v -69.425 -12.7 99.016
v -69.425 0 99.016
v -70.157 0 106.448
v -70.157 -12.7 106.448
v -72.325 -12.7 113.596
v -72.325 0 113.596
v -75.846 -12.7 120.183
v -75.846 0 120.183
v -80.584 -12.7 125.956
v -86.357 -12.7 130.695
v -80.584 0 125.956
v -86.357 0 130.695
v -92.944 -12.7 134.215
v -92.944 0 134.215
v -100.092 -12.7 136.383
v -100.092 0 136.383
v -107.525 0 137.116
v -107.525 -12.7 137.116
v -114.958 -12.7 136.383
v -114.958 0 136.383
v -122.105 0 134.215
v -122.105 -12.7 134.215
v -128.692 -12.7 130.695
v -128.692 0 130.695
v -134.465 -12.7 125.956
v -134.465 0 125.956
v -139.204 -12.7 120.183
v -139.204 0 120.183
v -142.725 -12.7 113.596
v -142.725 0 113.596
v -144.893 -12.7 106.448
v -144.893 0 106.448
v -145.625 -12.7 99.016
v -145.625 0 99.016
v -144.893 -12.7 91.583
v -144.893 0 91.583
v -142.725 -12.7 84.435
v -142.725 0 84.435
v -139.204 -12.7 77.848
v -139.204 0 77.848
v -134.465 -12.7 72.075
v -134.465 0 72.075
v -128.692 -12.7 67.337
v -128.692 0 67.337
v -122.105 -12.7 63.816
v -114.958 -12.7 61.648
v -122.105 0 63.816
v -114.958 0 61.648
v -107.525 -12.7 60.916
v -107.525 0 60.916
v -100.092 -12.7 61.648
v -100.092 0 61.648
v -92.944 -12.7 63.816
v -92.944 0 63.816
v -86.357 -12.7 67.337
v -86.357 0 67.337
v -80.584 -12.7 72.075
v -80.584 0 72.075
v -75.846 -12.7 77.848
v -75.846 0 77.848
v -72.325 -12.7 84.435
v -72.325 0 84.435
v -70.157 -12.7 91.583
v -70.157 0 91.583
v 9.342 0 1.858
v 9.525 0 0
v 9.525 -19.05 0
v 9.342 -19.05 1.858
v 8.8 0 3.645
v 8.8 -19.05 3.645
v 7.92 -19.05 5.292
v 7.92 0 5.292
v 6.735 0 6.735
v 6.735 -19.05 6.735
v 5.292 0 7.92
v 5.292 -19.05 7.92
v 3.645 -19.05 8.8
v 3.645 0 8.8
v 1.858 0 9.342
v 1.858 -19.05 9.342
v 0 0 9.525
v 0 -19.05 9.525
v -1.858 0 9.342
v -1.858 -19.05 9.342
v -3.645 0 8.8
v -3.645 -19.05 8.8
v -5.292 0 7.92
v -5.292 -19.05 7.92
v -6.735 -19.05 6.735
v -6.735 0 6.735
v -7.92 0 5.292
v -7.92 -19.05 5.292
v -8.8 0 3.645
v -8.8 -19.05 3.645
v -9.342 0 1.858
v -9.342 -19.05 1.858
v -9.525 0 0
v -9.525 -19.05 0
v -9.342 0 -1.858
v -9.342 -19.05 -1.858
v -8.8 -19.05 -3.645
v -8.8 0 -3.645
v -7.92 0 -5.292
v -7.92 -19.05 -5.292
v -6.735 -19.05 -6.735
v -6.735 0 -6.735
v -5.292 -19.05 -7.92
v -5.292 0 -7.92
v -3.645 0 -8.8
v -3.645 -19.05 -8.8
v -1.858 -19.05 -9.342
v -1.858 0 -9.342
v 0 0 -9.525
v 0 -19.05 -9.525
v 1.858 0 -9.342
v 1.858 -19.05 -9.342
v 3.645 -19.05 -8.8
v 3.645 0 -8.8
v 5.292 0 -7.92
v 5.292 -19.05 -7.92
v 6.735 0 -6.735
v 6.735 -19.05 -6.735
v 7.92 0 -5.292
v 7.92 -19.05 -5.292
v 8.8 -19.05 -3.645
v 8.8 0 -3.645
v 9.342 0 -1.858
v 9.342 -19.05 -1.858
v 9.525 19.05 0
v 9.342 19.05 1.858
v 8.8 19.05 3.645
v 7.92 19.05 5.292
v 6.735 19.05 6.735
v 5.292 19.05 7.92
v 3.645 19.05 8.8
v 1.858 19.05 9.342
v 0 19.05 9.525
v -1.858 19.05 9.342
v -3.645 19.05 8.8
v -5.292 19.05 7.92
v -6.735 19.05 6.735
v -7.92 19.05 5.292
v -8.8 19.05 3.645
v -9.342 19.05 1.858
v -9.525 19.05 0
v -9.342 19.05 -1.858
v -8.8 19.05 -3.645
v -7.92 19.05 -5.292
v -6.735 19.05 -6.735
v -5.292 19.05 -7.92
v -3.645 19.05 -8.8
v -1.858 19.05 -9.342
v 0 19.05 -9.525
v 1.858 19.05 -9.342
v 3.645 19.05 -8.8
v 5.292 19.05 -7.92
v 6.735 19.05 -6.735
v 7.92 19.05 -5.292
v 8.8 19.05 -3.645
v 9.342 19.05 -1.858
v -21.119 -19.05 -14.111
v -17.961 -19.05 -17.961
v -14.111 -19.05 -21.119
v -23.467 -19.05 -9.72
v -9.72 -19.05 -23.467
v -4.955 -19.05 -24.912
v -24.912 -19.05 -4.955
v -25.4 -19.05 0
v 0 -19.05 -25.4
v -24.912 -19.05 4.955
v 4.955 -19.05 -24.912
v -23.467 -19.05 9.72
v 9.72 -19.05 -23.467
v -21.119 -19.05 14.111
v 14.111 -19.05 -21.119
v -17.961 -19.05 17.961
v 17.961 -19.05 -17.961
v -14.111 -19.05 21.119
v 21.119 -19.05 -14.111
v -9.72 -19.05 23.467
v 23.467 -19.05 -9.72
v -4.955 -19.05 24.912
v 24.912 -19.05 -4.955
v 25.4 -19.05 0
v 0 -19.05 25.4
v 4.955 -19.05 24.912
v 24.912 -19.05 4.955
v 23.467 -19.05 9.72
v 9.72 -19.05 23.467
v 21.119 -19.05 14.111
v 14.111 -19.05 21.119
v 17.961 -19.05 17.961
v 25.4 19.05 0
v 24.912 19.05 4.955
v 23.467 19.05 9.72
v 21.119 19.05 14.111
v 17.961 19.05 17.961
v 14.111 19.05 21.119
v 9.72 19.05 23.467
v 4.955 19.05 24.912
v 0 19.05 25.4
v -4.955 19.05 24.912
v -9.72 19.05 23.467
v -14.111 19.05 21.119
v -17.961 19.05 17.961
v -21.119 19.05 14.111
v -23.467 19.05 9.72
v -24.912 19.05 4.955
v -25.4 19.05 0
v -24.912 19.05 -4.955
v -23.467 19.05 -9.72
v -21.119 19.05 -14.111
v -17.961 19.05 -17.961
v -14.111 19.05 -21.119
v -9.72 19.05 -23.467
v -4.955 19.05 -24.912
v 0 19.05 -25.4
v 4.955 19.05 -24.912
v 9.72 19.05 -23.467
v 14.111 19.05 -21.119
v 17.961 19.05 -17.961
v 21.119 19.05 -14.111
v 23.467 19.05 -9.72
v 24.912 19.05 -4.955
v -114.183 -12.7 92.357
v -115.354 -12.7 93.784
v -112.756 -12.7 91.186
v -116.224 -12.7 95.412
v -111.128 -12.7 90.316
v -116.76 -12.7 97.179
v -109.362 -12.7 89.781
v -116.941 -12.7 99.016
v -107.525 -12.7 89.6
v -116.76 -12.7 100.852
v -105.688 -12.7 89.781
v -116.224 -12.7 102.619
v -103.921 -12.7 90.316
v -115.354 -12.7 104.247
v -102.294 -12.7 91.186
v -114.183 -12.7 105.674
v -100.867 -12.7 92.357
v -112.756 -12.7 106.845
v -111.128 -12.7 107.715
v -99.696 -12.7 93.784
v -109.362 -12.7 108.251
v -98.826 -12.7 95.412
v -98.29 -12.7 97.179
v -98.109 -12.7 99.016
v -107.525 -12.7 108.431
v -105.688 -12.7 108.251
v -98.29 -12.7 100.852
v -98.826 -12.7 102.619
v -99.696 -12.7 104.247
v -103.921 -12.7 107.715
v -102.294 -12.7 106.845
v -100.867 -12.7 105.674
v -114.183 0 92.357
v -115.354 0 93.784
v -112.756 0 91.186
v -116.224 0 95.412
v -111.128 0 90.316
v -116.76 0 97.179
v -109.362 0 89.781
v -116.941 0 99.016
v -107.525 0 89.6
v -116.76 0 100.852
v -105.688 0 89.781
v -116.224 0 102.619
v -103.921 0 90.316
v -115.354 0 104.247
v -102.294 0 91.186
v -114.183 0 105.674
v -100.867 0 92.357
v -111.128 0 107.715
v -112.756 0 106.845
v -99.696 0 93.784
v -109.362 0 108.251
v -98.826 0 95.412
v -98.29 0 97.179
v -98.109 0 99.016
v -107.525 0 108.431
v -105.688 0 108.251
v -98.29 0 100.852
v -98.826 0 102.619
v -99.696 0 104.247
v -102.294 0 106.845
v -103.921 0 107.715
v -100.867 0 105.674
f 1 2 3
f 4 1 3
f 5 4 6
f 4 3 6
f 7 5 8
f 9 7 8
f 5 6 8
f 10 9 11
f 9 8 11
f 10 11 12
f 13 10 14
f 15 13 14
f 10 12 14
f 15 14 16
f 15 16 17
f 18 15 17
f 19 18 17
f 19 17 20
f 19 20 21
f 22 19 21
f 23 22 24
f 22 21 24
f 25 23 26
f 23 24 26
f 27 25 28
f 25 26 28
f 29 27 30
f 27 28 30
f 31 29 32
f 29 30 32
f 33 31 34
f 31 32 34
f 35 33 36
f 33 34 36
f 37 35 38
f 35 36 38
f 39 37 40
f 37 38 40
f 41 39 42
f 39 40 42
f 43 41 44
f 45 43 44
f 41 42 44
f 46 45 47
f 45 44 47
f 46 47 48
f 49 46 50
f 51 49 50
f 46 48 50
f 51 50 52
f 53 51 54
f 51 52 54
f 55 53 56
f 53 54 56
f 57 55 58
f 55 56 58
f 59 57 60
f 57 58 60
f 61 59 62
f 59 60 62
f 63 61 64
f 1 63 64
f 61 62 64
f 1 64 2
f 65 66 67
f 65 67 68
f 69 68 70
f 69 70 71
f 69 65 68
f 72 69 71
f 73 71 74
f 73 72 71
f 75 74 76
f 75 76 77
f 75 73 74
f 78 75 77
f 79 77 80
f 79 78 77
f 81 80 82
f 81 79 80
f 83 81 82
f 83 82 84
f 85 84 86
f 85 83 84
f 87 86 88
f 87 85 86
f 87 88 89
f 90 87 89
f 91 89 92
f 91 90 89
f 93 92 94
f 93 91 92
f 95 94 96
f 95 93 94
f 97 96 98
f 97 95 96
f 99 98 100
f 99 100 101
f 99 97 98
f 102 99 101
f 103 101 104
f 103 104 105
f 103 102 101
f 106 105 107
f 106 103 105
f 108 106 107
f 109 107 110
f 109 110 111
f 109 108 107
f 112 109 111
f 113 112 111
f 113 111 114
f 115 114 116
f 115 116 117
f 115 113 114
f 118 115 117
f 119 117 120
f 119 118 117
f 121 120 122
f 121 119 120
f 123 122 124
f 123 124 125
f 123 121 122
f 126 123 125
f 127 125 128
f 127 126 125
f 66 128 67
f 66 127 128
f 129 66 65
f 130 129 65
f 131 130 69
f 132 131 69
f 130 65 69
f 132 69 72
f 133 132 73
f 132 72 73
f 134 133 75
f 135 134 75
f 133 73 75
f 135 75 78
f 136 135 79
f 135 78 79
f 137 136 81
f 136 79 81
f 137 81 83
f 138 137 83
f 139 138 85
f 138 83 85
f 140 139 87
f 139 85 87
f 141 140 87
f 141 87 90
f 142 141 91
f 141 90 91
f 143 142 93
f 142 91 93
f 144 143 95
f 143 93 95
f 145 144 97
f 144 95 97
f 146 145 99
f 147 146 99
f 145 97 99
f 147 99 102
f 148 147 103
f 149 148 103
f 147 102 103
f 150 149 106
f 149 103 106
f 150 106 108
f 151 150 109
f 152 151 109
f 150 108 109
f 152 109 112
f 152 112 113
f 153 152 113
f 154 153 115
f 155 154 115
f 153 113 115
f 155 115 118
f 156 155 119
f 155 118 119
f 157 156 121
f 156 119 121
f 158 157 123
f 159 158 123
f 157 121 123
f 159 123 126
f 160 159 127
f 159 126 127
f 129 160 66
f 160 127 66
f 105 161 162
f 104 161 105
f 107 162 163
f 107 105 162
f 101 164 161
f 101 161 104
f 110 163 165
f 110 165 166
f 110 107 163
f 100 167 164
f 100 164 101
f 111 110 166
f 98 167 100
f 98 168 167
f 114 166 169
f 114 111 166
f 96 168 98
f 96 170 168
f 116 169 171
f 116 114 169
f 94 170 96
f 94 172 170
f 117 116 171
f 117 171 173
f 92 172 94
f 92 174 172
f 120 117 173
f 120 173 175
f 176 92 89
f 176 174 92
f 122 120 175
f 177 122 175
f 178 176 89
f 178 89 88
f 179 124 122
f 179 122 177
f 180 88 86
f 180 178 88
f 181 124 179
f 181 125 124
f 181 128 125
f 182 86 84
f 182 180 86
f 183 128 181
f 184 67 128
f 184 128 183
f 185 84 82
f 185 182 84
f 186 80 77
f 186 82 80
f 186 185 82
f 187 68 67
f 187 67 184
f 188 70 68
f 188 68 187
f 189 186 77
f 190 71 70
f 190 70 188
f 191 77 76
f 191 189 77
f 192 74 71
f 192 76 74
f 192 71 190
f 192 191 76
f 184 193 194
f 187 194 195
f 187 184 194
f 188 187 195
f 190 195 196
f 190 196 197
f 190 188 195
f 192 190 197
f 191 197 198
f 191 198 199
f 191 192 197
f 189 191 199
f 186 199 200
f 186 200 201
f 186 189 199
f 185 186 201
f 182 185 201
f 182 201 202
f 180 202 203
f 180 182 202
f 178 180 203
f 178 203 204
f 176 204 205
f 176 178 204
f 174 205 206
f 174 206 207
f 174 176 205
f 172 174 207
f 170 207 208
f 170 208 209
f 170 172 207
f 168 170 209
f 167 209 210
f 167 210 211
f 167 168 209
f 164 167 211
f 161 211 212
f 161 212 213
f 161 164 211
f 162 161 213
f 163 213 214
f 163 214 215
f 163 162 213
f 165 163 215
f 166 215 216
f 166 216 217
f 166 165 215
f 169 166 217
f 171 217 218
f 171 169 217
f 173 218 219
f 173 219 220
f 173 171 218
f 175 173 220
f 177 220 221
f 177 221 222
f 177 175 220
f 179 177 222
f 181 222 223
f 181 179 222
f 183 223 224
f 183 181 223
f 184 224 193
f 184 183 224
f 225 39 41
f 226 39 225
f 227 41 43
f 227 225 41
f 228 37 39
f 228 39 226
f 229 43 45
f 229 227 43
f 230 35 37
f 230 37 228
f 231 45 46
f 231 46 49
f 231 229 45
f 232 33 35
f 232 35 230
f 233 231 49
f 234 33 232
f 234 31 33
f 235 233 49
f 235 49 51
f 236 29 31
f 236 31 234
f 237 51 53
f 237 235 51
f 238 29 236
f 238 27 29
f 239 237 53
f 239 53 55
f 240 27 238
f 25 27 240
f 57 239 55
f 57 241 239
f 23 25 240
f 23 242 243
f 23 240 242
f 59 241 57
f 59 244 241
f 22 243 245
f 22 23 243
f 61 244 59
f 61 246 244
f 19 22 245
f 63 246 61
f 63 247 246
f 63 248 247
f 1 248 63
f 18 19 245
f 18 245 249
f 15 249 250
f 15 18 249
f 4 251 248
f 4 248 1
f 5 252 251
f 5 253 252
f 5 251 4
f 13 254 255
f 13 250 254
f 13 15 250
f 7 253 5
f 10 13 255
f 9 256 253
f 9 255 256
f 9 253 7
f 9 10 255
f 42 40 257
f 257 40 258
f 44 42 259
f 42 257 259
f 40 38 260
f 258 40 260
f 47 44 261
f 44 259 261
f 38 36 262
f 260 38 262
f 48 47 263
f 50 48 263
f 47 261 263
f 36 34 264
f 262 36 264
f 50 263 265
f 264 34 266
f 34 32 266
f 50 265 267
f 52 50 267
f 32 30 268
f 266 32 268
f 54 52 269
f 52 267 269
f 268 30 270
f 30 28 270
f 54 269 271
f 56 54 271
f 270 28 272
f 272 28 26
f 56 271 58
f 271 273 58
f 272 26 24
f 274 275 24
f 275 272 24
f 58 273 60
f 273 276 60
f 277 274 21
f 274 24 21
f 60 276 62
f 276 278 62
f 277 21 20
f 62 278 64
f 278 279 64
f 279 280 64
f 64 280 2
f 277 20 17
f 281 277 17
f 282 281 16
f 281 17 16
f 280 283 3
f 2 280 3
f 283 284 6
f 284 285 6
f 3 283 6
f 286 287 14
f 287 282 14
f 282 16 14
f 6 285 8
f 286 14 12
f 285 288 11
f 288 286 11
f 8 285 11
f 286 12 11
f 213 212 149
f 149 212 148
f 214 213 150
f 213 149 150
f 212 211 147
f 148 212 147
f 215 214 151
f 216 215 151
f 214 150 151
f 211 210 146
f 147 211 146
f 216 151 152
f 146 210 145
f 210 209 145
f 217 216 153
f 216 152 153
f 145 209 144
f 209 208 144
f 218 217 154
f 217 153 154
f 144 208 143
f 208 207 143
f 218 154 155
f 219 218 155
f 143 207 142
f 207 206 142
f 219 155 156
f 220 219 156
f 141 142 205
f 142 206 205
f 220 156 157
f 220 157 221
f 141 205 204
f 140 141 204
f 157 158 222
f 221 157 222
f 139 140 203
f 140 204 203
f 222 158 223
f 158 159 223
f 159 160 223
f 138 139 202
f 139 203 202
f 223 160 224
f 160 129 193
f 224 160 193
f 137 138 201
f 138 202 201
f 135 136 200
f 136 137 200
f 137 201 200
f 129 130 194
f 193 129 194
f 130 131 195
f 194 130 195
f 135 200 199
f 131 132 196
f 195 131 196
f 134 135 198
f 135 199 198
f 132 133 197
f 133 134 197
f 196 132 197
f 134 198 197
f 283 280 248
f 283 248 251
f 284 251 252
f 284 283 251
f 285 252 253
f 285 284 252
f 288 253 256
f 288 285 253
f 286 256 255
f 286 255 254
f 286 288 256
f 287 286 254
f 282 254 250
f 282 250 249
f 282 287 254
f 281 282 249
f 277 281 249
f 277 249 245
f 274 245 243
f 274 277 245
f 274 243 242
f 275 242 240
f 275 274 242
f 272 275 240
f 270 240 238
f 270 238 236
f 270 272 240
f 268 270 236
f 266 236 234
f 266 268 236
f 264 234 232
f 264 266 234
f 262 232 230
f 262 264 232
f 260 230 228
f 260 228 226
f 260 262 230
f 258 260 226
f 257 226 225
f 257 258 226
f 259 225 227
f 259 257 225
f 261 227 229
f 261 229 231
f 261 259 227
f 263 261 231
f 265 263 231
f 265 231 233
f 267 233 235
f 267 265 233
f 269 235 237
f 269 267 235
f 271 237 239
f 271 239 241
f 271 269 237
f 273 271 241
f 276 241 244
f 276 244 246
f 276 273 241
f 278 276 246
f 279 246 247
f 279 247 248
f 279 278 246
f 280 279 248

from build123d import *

# Parameters (mm, degrees)
F0_R     = 25.4
F0_R_2   = 9.525
F1_DEPTH = 19.05
F3_R     = 38.1
F3_R_2   = 9.415919
F4_DEPTH = 12.7


with BuildPart() as f1:
    # F0 (on Front) → F1 (new body)
    with BuildSketch(Plane.XZ):
        Circle(F0_R)
        Circle(F0_R_2, mode=Mode.SUBTRACT)
    extrude(amount=F1_DEPTH)

    # F2: F1 across plane


with BuildPart() as f1_1:
    add(f1.part)
    add(f1.part.mirror(Plane.XZ))


with BuildPart() as f4:
    # F3 (on Front) → F4 (new body)
    with BuildSketch(Plane.XZ):
        with Locations((-107.524708, 99.015534)):
            Circle(F3_R)
        with Locations((-107.524708, 99.015534)):
            Circle(F3_R_2, mode=Mode.SUBTRACT)
    extrude(amount=F4_DEPTH)


solid = Compound([f1_1.part, f4.part])
